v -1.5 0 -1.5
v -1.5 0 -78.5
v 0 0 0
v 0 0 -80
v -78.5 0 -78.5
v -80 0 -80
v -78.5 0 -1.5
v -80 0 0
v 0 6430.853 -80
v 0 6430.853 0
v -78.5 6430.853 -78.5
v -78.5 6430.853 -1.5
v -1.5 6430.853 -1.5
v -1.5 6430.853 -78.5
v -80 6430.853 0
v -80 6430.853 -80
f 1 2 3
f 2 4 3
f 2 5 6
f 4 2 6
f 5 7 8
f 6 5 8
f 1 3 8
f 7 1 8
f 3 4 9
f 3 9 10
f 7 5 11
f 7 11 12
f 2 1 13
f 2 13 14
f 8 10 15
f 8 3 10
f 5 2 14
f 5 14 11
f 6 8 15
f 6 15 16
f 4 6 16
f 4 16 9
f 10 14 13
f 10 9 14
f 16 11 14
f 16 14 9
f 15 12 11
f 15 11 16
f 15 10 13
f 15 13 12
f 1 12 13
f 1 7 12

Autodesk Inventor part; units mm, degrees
ref_plane "YZ Plane" through (0, 0, 0) normal (1, 0, 0) x (0, 1, 0)
ref_plane "XZ Plane" through (0, 0, 0) normal (0, 1, 0) x (-1, 0, 0)
ref_plane "XY Plane" through (0, 0, 0) normal (0, 0, 1) x (1, 0, 0)
sketch "Boceto1" plane through (0, 0, 0) normal (0, 1, 0) x (-1, 0, 0)
  line L0 (0, 0) -> (80, 0)
  line L1 (80, 0) -> (80, -80)
  line L2 (80, -80) -> (0, -80)
  line L3 (0, -80) -> (0, 0)
  line L4 (1.5, -78.5) -> (78.5, -78.5)
  line L5 (78.5, -78.5) -> (78.5, -1.5)
  line L6 (78.5, -1.5) -> (1.5, -1.5)
  line L7 (1.5, -1.5) -> (1.5, -78.5)
  line L8 (1.5, -78.5) -> (78.5, -1.5) construction
  line L9 (78.5, -78.5) -> (1.5, -1.5) construction
  point P0 (40, -40)
  dimension "d0" = 80
  dimension "d1" = 80
  dimension "d2" = 77
  dimension "d3" = 77
extrude "Extrusión1" add sketch "Boceto1" along normal blind 6430.853
properties part number "Pata_mesa"
